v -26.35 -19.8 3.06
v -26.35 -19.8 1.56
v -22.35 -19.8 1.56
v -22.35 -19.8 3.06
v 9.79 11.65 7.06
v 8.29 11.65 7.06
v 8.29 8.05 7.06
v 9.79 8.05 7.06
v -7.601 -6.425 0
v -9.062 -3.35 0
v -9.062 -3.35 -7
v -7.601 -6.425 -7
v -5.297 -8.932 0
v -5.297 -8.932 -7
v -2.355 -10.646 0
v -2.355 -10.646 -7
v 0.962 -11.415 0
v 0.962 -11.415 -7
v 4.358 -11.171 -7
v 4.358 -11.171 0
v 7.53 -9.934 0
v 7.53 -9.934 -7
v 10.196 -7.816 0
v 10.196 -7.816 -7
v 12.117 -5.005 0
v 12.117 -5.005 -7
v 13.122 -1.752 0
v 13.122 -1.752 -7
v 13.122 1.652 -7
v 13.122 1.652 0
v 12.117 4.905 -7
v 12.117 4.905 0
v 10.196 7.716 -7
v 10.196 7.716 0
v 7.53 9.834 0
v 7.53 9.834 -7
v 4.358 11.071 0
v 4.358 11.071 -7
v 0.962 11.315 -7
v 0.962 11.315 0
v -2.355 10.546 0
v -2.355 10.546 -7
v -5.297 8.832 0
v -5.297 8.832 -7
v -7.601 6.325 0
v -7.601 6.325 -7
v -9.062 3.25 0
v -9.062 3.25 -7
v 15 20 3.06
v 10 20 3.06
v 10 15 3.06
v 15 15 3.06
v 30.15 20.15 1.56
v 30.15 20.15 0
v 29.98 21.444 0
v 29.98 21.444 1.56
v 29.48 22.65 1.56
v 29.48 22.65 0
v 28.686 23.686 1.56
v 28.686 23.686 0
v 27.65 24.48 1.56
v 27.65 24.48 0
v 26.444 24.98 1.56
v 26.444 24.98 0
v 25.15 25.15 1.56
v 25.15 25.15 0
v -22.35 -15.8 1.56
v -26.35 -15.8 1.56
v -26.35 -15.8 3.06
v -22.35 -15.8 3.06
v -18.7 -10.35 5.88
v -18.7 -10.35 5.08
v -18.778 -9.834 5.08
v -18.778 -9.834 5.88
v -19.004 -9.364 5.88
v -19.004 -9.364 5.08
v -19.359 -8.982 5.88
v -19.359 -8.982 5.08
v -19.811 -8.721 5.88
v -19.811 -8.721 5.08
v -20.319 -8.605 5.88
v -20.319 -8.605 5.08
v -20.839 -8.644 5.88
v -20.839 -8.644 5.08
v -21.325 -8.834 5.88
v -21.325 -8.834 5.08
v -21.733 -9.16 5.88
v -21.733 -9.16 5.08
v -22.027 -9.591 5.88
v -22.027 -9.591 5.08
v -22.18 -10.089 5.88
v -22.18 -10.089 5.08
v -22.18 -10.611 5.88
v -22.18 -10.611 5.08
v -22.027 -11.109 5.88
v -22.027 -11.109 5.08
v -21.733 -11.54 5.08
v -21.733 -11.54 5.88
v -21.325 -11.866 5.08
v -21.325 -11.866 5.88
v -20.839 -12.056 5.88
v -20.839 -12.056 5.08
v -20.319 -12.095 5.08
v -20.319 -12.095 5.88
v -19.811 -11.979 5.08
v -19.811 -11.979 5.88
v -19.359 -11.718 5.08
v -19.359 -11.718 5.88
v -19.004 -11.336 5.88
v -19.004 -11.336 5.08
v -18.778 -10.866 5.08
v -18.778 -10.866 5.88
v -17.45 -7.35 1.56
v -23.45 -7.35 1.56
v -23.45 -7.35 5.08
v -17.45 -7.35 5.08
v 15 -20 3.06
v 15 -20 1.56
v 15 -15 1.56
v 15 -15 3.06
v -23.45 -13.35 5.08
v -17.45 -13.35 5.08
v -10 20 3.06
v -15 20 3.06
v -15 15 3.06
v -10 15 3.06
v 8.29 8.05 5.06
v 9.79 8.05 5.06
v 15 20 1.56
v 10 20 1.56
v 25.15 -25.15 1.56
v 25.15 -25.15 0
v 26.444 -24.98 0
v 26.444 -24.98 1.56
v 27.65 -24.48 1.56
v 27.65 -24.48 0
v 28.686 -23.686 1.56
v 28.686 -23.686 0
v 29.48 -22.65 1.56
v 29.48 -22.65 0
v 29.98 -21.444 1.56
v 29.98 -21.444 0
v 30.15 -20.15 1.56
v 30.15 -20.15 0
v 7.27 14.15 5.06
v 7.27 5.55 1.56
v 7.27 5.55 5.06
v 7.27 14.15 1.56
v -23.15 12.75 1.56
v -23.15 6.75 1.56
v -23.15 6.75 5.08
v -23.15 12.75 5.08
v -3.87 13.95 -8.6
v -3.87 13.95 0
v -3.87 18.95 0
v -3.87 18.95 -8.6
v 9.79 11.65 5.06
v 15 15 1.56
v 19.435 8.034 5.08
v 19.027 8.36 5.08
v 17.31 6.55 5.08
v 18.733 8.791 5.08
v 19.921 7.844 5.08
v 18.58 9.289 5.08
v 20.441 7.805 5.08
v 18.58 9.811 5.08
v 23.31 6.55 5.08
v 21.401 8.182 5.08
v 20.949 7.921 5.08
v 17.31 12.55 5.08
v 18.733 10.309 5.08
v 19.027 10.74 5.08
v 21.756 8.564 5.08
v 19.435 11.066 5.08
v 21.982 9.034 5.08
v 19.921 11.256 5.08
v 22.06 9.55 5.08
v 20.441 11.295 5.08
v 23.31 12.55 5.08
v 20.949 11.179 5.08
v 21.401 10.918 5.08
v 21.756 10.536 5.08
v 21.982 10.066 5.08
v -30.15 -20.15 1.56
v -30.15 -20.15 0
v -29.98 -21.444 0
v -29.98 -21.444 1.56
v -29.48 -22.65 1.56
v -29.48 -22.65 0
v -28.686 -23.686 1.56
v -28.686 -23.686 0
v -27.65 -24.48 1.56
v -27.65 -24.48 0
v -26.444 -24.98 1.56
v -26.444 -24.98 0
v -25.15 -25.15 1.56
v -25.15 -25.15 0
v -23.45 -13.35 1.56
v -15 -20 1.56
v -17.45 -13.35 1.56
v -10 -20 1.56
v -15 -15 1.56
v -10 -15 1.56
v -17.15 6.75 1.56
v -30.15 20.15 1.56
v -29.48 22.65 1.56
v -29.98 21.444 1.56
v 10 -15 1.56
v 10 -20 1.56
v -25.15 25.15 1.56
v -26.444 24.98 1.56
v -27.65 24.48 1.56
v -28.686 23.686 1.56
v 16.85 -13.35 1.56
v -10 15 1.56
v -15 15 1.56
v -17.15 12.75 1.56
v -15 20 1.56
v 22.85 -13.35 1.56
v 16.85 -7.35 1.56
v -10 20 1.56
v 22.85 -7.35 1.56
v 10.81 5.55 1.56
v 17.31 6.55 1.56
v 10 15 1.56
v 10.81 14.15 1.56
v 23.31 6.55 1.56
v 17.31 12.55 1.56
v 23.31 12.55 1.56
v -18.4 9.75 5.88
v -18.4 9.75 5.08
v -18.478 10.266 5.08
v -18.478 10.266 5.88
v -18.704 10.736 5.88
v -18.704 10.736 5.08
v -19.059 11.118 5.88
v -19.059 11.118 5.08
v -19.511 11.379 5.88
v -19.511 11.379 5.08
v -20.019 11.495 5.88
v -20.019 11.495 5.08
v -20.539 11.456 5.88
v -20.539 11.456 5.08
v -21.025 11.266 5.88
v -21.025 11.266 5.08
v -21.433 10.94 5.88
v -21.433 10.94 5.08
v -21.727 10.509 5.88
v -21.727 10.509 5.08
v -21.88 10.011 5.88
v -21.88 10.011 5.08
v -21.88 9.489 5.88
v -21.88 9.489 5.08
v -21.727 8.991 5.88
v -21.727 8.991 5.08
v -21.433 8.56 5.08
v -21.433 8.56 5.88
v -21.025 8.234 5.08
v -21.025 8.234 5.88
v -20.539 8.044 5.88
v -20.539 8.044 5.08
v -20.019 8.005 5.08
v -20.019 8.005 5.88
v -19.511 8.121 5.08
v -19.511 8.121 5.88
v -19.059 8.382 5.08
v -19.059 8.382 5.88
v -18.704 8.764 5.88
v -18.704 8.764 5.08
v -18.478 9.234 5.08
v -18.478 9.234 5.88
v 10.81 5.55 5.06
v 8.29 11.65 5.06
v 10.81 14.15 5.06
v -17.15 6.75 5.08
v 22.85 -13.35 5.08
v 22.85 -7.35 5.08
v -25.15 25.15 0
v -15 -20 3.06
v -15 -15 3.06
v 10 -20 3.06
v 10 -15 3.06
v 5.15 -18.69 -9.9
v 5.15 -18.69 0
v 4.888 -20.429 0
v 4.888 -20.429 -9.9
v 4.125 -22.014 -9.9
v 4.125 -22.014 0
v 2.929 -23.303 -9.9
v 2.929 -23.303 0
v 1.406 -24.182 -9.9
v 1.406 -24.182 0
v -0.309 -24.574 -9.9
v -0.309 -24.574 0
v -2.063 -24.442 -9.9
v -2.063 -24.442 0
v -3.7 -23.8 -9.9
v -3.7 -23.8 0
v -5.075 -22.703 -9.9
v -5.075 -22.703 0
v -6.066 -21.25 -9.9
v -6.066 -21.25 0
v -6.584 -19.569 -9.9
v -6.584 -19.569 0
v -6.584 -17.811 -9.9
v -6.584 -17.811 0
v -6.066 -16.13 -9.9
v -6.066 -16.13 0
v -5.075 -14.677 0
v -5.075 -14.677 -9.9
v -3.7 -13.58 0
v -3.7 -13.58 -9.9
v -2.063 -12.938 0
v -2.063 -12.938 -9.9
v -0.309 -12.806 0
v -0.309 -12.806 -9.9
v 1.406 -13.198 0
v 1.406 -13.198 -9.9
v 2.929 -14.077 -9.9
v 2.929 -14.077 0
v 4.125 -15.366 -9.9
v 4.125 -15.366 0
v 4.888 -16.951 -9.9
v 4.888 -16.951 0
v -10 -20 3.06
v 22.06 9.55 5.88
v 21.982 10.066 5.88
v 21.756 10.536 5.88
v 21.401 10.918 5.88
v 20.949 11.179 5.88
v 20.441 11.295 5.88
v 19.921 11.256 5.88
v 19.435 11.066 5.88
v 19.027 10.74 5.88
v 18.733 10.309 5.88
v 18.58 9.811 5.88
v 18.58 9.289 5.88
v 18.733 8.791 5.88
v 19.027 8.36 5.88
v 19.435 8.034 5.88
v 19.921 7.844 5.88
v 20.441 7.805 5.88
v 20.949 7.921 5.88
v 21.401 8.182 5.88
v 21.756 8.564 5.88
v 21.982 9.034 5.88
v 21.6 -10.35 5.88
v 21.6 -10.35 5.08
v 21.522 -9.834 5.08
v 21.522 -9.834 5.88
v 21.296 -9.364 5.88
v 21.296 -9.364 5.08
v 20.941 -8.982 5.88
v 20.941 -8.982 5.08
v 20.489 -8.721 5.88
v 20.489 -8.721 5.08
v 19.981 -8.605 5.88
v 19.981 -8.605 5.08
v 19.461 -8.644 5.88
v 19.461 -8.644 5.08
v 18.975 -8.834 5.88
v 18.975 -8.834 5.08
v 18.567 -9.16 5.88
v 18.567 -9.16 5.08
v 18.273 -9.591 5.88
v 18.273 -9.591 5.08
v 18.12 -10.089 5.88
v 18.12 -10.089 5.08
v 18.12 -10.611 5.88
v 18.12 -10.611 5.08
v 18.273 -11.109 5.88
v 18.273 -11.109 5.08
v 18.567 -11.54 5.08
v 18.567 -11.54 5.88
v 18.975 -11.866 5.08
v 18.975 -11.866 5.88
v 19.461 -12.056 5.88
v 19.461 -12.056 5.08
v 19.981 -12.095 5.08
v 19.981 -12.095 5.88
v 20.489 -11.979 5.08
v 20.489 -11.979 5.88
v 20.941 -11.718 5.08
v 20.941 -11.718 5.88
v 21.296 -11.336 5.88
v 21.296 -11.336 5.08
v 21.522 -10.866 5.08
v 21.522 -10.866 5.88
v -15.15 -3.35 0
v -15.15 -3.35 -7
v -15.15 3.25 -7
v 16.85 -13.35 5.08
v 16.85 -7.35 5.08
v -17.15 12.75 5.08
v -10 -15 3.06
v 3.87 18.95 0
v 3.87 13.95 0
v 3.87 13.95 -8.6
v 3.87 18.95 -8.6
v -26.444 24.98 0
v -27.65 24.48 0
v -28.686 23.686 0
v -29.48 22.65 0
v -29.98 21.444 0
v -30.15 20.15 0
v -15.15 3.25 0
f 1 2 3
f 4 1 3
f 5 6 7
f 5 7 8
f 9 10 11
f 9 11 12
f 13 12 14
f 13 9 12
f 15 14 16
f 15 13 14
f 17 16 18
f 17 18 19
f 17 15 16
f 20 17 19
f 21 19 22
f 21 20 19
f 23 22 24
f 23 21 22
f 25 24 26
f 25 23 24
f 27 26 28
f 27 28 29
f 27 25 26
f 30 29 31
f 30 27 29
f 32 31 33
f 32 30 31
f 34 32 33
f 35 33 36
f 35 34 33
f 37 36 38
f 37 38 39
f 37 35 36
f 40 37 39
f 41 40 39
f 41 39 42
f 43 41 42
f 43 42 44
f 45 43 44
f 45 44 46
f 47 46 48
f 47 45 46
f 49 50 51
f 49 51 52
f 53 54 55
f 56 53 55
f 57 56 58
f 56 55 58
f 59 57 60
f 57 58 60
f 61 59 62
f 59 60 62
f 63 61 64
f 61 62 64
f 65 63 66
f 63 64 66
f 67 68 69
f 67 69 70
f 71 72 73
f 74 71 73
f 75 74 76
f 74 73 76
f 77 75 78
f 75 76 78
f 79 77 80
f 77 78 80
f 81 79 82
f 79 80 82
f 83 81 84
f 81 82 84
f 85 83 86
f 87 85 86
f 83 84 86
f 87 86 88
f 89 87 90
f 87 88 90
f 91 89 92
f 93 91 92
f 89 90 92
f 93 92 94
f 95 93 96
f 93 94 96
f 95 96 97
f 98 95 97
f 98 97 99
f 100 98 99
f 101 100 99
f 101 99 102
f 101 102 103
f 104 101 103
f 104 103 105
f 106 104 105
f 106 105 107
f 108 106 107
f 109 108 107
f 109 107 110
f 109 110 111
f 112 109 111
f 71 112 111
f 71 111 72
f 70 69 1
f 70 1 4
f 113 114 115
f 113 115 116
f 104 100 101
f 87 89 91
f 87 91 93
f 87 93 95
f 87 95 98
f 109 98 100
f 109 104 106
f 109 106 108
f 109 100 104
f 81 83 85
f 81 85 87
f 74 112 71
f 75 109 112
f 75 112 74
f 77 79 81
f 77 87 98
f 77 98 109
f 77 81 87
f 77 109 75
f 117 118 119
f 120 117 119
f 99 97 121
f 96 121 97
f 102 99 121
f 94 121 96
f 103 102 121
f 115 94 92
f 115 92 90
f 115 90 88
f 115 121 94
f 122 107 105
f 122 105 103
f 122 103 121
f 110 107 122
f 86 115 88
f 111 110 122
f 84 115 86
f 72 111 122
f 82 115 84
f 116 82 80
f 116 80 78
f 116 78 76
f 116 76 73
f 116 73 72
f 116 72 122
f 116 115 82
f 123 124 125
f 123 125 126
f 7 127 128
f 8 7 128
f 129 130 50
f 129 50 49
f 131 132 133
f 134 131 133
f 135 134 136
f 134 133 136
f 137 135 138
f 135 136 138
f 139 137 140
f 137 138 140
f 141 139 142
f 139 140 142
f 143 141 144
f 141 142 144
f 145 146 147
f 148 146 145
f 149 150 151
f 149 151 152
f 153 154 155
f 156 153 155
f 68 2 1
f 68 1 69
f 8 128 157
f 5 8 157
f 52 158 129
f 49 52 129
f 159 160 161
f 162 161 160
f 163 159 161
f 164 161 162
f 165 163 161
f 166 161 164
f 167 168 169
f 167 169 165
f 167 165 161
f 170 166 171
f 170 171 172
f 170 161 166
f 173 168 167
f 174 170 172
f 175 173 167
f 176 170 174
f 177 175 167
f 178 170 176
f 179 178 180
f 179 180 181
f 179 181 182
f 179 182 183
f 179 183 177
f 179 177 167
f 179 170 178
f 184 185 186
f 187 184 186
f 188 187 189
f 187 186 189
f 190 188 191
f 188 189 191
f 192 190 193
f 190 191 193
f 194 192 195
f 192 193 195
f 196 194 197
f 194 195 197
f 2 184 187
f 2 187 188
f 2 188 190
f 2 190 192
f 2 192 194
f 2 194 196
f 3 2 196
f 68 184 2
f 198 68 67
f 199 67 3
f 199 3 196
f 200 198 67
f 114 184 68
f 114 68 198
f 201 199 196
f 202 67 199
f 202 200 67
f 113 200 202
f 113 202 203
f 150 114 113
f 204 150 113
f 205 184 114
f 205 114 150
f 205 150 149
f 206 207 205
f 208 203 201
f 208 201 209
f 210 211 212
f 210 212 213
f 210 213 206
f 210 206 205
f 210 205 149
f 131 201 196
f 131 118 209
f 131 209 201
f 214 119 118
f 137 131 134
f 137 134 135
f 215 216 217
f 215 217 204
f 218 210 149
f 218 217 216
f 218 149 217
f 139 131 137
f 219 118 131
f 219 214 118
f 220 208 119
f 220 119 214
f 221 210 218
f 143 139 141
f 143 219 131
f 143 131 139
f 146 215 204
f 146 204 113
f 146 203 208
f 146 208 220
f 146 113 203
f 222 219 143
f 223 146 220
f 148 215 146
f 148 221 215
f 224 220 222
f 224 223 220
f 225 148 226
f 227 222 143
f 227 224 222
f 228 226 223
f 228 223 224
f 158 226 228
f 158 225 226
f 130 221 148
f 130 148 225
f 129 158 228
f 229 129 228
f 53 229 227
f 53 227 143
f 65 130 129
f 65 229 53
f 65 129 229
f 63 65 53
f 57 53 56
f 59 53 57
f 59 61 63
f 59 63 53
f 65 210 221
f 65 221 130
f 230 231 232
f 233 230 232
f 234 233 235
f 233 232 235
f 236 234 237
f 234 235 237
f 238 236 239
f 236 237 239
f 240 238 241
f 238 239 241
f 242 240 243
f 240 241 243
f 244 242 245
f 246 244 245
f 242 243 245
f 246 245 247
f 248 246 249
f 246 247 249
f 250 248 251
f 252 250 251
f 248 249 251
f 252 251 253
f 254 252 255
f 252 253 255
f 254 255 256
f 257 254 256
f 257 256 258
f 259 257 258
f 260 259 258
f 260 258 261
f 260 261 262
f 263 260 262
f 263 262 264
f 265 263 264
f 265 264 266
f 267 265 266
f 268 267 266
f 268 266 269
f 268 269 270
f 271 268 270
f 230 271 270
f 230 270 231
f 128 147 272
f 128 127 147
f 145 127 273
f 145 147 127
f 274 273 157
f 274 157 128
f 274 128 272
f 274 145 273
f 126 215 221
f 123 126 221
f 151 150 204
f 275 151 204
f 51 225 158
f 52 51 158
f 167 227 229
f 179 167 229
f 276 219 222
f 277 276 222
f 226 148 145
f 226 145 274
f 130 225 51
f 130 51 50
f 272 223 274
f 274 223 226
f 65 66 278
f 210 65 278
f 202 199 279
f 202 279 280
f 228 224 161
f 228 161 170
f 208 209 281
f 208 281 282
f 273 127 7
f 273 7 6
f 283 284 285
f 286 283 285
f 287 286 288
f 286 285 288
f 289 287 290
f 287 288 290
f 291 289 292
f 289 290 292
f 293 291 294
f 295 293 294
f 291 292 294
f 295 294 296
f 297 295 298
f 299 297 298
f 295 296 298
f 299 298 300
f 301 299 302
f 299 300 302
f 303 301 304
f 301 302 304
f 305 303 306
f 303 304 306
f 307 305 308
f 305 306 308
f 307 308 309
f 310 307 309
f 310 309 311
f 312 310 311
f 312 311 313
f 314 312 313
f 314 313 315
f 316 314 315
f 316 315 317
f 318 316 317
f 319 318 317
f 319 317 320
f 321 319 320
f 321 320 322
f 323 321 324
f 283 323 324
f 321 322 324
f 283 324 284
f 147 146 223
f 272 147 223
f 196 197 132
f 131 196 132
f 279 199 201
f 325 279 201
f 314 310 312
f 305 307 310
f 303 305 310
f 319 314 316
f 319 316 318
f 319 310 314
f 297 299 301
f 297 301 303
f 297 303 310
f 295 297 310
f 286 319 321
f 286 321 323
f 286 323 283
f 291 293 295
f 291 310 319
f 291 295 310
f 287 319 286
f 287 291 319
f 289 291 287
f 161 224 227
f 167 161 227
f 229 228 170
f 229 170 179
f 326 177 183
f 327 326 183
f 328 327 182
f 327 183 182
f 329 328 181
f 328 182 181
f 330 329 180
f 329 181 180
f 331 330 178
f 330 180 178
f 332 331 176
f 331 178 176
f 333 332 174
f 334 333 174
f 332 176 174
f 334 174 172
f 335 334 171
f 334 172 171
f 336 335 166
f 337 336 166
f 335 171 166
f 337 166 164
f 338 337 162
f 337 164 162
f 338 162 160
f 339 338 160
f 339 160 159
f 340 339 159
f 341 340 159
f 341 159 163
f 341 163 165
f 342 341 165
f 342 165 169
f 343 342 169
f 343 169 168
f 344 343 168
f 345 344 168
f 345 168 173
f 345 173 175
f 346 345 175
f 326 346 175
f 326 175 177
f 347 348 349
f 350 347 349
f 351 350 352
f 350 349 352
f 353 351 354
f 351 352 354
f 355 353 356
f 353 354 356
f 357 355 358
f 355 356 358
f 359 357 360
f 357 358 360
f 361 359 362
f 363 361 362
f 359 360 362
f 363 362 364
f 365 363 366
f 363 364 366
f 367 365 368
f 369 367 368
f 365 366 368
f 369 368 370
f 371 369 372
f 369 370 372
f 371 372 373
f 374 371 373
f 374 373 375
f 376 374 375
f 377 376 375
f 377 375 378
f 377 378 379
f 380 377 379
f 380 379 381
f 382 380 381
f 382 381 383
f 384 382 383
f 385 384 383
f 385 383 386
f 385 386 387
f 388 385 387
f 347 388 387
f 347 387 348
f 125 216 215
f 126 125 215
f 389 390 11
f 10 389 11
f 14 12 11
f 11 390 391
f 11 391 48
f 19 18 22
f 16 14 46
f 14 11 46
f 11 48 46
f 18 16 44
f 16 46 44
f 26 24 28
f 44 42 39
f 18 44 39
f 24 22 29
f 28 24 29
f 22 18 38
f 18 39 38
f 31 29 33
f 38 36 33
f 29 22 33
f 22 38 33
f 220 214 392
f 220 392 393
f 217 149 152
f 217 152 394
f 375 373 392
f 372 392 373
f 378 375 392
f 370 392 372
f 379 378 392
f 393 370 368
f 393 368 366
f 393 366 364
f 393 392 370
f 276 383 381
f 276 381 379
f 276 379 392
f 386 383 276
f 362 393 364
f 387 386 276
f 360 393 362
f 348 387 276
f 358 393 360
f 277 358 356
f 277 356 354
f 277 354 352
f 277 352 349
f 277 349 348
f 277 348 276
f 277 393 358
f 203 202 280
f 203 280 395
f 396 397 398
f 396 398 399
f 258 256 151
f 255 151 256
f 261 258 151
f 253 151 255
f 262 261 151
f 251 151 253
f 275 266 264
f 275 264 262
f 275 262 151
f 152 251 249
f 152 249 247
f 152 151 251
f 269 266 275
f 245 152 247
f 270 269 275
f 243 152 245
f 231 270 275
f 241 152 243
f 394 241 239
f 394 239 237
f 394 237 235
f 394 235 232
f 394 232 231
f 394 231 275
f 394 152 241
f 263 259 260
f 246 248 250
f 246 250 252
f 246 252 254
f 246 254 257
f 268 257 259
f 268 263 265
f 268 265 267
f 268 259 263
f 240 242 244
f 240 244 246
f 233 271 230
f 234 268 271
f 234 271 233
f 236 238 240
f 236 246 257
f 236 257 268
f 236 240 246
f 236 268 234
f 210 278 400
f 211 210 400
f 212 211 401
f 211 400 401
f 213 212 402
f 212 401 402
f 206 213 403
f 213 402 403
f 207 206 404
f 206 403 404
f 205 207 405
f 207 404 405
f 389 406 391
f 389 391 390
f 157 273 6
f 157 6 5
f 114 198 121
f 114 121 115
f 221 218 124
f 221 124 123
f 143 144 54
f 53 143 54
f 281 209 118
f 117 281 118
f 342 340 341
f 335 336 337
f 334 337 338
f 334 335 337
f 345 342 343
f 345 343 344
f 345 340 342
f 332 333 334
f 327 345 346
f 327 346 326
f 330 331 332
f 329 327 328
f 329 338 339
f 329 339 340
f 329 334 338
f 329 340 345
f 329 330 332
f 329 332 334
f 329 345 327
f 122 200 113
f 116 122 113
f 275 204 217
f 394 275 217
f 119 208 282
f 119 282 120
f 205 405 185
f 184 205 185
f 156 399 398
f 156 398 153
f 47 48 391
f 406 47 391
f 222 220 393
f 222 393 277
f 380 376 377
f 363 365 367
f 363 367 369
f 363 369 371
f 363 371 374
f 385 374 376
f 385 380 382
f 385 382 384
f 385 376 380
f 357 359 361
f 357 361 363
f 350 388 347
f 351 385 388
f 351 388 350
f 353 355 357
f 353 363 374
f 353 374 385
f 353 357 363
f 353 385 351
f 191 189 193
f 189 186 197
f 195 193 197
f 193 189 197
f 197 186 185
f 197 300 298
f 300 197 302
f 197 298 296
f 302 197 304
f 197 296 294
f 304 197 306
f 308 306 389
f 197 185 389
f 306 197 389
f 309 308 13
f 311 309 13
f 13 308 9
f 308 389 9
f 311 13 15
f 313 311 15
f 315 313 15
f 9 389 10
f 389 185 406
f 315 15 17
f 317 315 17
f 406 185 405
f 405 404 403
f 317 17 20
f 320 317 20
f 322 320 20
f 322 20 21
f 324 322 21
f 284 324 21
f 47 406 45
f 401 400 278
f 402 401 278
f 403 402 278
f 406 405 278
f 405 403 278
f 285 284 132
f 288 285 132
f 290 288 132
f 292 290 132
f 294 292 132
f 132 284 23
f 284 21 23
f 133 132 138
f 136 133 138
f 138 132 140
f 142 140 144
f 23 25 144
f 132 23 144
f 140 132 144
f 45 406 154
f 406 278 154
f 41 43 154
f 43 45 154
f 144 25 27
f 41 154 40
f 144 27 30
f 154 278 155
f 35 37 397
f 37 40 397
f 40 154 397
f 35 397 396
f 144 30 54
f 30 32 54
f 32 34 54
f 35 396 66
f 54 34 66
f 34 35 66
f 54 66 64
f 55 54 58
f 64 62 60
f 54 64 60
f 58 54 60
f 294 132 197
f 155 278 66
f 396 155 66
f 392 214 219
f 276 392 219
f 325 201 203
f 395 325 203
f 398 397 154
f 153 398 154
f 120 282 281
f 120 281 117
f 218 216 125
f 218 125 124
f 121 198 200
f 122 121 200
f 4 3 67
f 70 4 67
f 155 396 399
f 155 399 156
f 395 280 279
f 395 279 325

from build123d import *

# Parameters (mm, degrees)
PCB_DEPTH           = 1.56
ESQUISSE2_W         = 6
ESQUISSE2_H         = 6
CORPSBP_DEPTH       = 3.52
ESQUISSE2_3_R       = 1.75
BPBP_DEPTH          = 4.32
ESQUISSE2_4_W       = 3.54
ESQUISSE2_4_H       = 8.6
CORPSONOFF_DEPTH    = 3.5
ESQUISSE2_5_W       = 1.5
ESQUISSE2_5_H       = 3.6
BPONOFF_DEPTH       = 5.5
ESQUISSE2_6_W       = 5
ESQUISSE2_6_H       = 5
BOSS_EXTRU_9_DEPTH  = 1.5
ESQUISSE5_R         = 5.9
BUZZER_DEPTH        = 9.9
ESQUISSE5_4_W       = 7.74
ESQUISSE5_4_H       = 5
ISP_DEPTH           = 8.6
CR2032_DEPTH        = 7
ESQUISSE6_W         = 4
ESQUISSE6_H         = 4
BOSS_EXTRU_10_DEPTH = 1.5


with BuildPart() as part:
    # Esquisse1 → PCB (new body)
    with BuildSketch(Plane.XY):
        with BuildLine():
            Line((-25.15, -25.15), (25.15, -25.15))
            ThreePointArc((25.15, -25.15), (28.685533906, -23.685533906), (30.15, -20.15))
            Line((30.15, -20.15), (30.15, 20.15))
            ThreePointArc((30.15, 20.15), (28.685533906, 23.685533906), (25.15, 25.15))
            Line((25.15, 25.15), (-25.15, 25.15))
            ThreePointArc((-25.15, 25.15), (-28.685533906, 23.685533906), (-30.15, 20.15))
            Line((-30.15, 20.15), (-30.15, -20.15))
            ThreePointArc((-30.15, -20.15), (-28.685533906, -23.685533906), (-25.15, -25.15))
        make_face()
    extrude(amount=PCB_DEPTH)

    # Esquisse2 → CorpsBp (add)
    with BuildSketch(Plane.XY.offset(1.56)):
        with Locations((20.31, 9.55)):
            Rectangle(ESQUISSE2_W, ESQUISSE2_H)
        with Locations((19.85, -10.35)):
            Rectangle(ESQUISSE2_W, ESQUISSE2_H)
        with Locations((-20.45, -10.35)):
            Rectangle(ESQUISSE2_W, ESQUISSE2_H)
        with Locations((-20.15, 9.75)):
            Rectangle(ESQUISSE2_W, ESQUISSE2_H)
    extrude(amount=CORPSBP_DEPTH)

    # Esquisse2<3> → BpBp (add)
    with BuildSketch(Plane.XY.offset(1.56)):
        with Locations((20.31, 9.55)):
            Circle(ESQUISSE2_3_R)
        with Locations((-20.15, 9.75)):
            Circle(ESQUISSE2_3_R)
        with Locations((-20.45, -10.35)):
            Circle(ESQUISSE2_3_R)
        with Locations((19.85, -10.35)):
            Circle(ESQUISSE2_3_R)
    extrude(amount=BPBP_DEPTH)

    # Esquisse2<4> → CorpsOnOff (add)
    with BuildSketch(Plane.XY.offset(1.56)):
        with Locations((9.04, 9.85)):
            Rectangle(ESQUISSE2_4_W, ESQUISSE2_4_H)
    extrude(amount=CORPSONOFF_DEPTH)

    # Esquisse2<5> → BpOnOff (add)
    with BuildSketch(Plane.XY.offset(1.56)):
        with Locations((9.04, 9.85)):
            Rectangle(ESQUISSE2_5_W, ESQUISSE2_5_H)
    extrude(amount=BPONOFF_DEPTH)

    # Esquisse2<6> → Boss.-Extru.9 (add)
    with BuildSketch(Plane.XY.offset(1.56)):
        with Locations((-12.5, 17.5)):
            Rectangle(ESQUISSE2_6_W, ESQUISSE2_6_H)
        with Locations((-12.5, -17.5)):
            Rectangle(ESQUISSE2_6_W, ESQUISSE2_6_H)
        with Locations((12.5, -17.5)):
            Rectangle(ESQUISSE2_6_W, ESQUISSE2_6_H)
        with Locations((12.5, 17.5)):
            Rectangle(ESQUISSE2_6_W, ESQUISSE2_6_H)
    extrude(amount=BOSS_EXTRU_9_DEPTH)

    # Esquisse5 → Buzzer (add)
    with BuildSketch(Plane(origin=(0, 0, 0), x_dir=(-1, 0, 0), z_dir=(0, 0, -1))):
        with Locations((0.75, -18.69)):
            Circle(ESQUISSE5_R)
    extrude(amount=BUZZER_DEPTH)

    # Esquisse5<4> → ISP (add)
    with BuildSketch(Plane(origin=(0, 0, 0), x_dir=(-1, 0, 0), z_dir=(0, 0, -1))):
        with Locations((0, 16.45)):
            Rectangle(ESQUISSE5_4_W, ESQUISSE5_4_H)
    extrude(amount=ISP_DEPTH)

    # Esquisse5<5> → CR2032 (add)
    with BuildSketch(Plane(origin=(0, 0, 0), x_dir=(-1, 0, 0), z_dir=(0, 0, -1))):
        with BuildLine():
            Line((9.061920088, 3.25), (15.15, 3.25))
            Line((15.15, 3.25), (15.15, -3.35))
            Line((15.15, -3.35), (9.061920088, -3.35))
            ThreePointArc((9.061920088, -3.35), (-13.25, -0.05), (9.061920088, 3.25))
        make_face()
    extrude(amount=CR2032_DEPTH)

    # Esquisse6 → Boss.-Extru.10 (add)
    with BuildSketch(Plane.XY.offset(1.56)):
        with Locations((-24.35, -17.8)):
            Rectangle(ESQUISSE6_W, ESQUISSE6_H)
    extrude(amount=BOSS_EXTRU_10_DEPTH)


solid = part.part
